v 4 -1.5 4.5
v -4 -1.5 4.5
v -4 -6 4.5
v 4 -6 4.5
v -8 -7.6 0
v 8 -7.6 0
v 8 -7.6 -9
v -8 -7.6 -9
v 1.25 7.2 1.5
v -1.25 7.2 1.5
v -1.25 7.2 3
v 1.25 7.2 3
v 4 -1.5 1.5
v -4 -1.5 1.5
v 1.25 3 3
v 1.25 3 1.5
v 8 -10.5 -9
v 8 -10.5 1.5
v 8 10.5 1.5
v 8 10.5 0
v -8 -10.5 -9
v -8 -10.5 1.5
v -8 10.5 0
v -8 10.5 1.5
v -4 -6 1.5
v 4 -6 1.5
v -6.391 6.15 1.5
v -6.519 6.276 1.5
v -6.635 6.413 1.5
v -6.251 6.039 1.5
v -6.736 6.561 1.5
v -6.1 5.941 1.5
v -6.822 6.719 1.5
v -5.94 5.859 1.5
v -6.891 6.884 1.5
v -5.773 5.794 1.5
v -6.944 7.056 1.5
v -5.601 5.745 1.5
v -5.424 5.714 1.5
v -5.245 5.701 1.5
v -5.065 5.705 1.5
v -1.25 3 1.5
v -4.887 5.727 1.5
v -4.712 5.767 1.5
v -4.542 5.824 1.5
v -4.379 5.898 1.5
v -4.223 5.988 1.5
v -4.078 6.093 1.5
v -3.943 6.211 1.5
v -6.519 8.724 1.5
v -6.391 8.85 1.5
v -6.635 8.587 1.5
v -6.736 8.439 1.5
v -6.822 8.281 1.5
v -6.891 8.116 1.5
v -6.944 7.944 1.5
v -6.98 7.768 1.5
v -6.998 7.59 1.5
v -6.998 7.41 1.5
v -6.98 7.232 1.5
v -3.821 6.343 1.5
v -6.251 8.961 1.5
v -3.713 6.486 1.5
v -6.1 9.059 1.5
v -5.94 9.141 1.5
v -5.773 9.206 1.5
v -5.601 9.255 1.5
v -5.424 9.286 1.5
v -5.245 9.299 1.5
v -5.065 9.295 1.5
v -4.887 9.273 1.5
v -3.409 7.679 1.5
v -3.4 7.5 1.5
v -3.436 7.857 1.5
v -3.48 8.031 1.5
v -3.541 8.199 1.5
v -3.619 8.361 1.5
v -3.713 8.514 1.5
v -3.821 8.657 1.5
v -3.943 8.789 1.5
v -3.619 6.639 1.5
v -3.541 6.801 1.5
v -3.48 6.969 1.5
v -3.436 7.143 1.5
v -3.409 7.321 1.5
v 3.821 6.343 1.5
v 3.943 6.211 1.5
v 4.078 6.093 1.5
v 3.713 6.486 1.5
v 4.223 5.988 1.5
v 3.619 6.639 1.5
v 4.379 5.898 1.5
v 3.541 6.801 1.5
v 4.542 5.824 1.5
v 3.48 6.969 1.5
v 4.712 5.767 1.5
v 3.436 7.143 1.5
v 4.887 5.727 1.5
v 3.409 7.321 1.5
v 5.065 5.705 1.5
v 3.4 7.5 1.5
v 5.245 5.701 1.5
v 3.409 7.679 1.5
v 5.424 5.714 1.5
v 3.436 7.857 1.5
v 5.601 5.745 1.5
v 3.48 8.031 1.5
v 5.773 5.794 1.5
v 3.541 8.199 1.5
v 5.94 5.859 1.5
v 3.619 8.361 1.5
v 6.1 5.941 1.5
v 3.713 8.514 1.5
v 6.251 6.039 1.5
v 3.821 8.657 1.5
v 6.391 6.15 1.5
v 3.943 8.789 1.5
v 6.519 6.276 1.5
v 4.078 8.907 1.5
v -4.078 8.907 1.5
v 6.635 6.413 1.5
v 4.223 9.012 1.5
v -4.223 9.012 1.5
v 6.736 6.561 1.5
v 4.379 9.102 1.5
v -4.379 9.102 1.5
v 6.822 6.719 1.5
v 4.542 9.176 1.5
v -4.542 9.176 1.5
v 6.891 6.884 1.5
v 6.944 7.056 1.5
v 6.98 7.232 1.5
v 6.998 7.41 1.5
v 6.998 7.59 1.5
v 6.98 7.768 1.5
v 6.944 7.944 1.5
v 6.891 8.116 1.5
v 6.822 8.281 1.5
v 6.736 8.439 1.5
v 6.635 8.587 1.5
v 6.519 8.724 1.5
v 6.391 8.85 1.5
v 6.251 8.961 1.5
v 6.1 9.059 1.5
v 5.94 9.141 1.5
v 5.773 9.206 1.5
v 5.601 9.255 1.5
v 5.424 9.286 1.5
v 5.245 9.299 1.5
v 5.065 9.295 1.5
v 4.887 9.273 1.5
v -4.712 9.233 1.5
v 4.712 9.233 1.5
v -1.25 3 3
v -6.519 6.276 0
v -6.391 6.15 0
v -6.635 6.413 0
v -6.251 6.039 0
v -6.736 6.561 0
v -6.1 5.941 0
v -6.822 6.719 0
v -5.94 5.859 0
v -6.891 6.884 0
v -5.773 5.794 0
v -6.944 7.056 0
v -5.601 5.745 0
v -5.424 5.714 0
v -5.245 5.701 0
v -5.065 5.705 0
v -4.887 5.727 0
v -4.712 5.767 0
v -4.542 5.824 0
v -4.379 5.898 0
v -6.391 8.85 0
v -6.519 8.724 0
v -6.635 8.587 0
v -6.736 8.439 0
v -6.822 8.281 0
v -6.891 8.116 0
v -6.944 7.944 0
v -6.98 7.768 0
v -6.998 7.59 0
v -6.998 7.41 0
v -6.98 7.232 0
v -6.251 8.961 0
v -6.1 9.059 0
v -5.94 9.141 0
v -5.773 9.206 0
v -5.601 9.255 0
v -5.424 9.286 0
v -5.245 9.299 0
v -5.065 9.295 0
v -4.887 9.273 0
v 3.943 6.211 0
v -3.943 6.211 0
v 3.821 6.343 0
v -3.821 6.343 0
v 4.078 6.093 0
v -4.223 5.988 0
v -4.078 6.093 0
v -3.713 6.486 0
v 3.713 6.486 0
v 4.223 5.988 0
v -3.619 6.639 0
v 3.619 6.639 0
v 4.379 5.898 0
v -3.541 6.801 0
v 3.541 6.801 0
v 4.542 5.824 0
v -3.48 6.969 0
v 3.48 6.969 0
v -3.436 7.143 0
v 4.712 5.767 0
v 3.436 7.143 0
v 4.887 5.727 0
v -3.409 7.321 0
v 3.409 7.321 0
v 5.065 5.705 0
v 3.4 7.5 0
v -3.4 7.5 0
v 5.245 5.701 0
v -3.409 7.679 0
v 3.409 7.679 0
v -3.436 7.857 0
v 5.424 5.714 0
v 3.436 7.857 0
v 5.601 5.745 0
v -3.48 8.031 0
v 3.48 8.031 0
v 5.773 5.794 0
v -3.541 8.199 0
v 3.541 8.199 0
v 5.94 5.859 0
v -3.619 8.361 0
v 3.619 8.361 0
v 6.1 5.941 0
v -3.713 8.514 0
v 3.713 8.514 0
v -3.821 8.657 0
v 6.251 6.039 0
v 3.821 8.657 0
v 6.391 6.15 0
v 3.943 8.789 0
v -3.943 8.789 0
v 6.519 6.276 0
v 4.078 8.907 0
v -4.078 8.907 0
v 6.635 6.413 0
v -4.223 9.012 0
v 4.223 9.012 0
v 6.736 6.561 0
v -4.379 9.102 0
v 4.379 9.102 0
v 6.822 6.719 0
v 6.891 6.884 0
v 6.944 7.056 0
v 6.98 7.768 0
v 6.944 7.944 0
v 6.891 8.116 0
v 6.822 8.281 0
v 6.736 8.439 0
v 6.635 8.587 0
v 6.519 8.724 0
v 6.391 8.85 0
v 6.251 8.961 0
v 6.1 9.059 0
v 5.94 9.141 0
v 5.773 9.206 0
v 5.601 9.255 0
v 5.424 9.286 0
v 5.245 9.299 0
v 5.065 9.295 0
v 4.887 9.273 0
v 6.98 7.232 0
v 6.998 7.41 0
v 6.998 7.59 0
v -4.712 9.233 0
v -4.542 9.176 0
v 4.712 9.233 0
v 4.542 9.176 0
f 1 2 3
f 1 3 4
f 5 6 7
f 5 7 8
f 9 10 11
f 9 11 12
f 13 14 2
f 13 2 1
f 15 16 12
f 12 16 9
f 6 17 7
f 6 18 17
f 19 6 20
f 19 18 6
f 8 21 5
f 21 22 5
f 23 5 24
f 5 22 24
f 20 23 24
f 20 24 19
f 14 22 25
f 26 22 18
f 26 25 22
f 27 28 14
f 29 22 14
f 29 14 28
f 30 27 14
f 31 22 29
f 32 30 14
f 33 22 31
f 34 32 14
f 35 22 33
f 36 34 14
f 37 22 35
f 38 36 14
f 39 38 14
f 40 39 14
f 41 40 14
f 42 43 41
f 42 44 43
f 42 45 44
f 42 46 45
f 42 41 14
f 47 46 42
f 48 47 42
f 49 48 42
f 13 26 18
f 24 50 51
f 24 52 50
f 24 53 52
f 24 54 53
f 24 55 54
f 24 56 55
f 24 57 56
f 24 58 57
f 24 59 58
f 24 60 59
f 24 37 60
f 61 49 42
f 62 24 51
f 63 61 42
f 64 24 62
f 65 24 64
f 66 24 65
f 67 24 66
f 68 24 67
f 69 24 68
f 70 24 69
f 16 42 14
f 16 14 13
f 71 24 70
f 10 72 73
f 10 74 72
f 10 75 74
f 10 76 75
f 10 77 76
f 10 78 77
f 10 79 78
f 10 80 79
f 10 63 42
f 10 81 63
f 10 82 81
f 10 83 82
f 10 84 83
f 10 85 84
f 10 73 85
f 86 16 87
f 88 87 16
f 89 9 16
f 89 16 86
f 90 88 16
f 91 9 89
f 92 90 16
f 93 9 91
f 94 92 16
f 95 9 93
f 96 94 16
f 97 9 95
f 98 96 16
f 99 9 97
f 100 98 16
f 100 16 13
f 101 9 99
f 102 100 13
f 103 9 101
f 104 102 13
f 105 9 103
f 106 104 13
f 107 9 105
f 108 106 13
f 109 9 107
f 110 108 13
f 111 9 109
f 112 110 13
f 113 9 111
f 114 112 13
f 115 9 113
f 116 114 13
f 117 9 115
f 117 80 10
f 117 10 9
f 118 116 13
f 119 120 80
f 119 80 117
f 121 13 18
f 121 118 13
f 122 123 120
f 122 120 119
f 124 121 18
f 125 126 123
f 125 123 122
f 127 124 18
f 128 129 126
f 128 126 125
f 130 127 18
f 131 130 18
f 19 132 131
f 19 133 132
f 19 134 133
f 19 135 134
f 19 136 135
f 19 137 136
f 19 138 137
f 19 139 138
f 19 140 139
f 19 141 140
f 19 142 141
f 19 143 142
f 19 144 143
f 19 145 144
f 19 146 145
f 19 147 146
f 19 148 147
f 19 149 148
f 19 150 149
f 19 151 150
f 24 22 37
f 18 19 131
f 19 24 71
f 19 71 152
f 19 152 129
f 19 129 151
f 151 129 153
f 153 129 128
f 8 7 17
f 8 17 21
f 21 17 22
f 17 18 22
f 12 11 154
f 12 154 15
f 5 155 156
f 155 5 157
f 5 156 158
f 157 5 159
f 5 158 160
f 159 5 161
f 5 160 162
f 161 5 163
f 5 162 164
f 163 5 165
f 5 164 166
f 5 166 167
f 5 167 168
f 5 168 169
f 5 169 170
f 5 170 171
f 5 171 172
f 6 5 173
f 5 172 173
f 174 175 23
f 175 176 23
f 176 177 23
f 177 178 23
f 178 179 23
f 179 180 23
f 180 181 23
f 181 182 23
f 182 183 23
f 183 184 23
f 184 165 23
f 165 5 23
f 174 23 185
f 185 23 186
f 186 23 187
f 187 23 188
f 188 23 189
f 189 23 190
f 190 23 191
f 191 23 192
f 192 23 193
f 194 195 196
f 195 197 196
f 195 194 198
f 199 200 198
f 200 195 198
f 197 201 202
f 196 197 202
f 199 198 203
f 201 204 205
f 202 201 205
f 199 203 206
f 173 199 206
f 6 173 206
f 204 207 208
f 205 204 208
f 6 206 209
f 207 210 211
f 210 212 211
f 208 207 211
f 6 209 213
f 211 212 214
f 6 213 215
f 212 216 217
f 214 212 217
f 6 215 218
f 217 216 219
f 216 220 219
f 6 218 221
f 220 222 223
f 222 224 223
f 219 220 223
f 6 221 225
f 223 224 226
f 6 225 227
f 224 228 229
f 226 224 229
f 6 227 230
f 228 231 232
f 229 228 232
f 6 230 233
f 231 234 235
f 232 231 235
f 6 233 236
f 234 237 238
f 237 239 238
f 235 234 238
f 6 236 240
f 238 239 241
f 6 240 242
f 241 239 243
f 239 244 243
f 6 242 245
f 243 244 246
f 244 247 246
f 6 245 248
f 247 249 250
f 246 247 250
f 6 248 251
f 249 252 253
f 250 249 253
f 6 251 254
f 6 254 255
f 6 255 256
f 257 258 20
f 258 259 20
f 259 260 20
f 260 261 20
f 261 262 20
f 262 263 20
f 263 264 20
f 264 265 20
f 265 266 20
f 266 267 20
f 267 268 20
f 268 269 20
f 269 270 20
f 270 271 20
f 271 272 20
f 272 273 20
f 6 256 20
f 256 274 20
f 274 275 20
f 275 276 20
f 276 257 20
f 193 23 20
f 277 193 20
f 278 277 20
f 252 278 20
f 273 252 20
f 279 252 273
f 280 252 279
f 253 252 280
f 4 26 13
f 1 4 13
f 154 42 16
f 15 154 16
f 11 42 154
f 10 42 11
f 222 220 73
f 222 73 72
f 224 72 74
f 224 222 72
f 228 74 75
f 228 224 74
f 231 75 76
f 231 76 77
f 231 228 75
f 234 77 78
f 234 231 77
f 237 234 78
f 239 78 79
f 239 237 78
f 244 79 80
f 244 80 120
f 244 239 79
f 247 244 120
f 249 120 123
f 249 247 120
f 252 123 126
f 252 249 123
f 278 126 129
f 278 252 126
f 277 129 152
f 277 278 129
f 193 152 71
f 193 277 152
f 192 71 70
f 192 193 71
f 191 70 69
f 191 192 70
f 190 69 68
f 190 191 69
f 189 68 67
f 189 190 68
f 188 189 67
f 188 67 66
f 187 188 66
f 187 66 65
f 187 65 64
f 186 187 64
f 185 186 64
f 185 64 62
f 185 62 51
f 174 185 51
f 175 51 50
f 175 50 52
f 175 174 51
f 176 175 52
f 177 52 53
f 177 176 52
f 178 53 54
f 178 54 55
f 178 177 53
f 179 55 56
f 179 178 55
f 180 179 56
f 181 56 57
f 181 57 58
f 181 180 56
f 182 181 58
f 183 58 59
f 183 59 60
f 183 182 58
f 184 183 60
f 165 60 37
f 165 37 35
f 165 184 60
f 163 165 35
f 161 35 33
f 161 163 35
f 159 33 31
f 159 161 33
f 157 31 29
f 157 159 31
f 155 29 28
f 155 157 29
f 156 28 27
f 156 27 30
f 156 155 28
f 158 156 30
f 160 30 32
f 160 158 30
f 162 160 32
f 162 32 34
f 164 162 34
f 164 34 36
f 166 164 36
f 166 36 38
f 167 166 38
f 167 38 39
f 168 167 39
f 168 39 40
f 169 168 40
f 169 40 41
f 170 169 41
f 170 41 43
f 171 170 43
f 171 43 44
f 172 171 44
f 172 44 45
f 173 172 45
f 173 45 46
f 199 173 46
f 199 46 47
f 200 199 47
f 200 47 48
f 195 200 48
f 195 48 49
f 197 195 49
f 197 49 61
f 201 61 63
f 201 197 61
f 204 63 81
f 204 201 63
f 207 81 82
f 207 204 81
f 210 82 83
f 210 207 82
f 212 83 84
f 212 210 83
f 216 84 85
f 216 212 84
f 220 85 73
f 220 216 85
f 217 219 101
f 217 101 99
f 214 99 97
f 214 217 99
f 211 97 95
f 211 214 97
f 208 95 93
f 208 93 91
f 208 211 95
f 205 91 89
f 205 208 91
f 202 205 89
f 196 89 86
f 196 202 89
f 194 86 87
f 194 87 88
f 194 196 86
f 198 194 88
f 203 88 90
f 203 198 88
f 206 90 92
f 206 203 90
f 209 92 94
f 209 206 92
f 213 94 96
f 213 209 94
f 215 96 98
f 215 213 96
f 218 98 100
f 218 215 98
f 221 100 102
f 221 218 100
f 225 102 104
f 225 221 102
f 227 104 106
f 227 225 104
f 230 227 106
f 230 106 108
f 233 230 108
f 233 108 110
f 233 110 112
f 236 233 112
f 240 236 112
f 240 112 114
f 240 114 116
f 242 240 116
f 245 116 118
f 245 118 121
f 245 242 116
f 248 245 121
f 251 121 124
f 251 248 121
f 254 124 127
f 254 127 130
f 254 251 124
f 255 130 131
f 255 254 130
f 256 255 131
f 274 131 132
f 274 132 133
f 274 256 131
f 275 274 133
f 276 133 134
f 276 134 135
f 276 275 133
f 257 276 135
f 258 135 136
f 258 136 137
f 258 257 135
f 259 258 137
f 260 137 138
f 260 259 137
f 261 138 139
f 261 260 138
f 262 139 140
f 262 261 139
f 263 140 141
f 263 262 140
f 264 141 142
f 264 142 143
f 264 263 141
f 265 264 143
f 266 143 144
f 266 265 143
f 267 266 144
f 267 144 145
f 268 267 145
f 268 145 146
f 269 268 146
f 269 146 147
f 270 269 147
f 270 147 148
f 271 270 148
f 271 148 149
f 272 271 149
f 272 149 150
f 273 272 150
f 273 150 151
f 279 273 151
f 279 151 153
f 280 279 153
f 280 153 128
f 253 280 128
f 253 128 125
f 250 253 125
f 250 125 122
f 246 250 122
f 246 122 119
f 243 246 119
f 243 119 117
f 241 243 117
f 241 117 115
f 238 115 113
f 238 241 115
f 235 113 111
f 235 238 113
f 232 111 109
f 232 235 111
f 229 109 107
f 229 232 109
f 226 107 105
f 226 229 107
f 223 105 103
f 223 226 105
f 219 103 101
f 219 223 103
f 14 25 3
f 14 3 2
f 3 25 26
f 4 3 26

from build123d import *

# Parameters (mm, degrees)
SKETCH1_W           = 16
SKETCH1_H           = 21
SKETCH1_R           = 1.8
BOSS_EXTRUDE1_DEPTH = 1.5
SKETCH2_W           = 2.5
SKETCH2_H           = 4.2
BOSS_EXTRUDE2_DEPTH = 1.5
SKETCH3_W           = 8
SKETCH3_H           = 4.5
BOSS_EXTRUDE3_DEPTH = 3
SKETCH4_W           = 16
SKETCH4_H           = 2.9
BOSS_EXTRUDE4_DEPTH = 9


with BuildPart() as part:
    # Sketch1 → Boss-Extrude1 (new body)
    with BuildSketch(Plane.XY):
        Rectangle(SKETCH1_W, SKETCH1_H)
        with Locations((-5.2, 7.5)):
            Circle(SKETCH1_R, mode=Mode.SUBTRACT)
        with Locations(Location((5.2, 7.5, 0), (0, 0, 180))):
            Circle(SKETCH1_R, mode=Mode.SUBTRACT)
    extrude(amount=BOSS_EXTRUDE1_DEPTH)

    # Sketch2 → Boss-Extrude2 (add)
    with BuildSketch(Plane.XY.offset(1.5)):
        with Locations((0, 5.1)):
            Rectangle(SKETCH2_W, SKETCH2_H)
    extrude(amount=BOSS_EXTRUDE2_DEPTH)

    # Sketch3 → Boss-Extrude3 (add)
    with BuildSketch(Plane.XY.offset(1.5)):
        with Locations((0, -3.75)):
            Rectangle(SKETCH3_W, SKETCH3_H)
    extrude(amount=BOSS_EXTRUDE3_DEPTH)

    # Sketch4 → Boss-Extrude4 (add)
    with BuildSketch(Plane(origin=(0, 0, 0), x_dir=(-1, 0, 0), z_dir=(0, 0, -1))):
        with Locations((0, -9.05)):
            Rectangle(SKETCH4_W, SKETCH4_H)
    extrude(amount=BOSS_EXTRUDE4_DEPTH)


solid = part.part
